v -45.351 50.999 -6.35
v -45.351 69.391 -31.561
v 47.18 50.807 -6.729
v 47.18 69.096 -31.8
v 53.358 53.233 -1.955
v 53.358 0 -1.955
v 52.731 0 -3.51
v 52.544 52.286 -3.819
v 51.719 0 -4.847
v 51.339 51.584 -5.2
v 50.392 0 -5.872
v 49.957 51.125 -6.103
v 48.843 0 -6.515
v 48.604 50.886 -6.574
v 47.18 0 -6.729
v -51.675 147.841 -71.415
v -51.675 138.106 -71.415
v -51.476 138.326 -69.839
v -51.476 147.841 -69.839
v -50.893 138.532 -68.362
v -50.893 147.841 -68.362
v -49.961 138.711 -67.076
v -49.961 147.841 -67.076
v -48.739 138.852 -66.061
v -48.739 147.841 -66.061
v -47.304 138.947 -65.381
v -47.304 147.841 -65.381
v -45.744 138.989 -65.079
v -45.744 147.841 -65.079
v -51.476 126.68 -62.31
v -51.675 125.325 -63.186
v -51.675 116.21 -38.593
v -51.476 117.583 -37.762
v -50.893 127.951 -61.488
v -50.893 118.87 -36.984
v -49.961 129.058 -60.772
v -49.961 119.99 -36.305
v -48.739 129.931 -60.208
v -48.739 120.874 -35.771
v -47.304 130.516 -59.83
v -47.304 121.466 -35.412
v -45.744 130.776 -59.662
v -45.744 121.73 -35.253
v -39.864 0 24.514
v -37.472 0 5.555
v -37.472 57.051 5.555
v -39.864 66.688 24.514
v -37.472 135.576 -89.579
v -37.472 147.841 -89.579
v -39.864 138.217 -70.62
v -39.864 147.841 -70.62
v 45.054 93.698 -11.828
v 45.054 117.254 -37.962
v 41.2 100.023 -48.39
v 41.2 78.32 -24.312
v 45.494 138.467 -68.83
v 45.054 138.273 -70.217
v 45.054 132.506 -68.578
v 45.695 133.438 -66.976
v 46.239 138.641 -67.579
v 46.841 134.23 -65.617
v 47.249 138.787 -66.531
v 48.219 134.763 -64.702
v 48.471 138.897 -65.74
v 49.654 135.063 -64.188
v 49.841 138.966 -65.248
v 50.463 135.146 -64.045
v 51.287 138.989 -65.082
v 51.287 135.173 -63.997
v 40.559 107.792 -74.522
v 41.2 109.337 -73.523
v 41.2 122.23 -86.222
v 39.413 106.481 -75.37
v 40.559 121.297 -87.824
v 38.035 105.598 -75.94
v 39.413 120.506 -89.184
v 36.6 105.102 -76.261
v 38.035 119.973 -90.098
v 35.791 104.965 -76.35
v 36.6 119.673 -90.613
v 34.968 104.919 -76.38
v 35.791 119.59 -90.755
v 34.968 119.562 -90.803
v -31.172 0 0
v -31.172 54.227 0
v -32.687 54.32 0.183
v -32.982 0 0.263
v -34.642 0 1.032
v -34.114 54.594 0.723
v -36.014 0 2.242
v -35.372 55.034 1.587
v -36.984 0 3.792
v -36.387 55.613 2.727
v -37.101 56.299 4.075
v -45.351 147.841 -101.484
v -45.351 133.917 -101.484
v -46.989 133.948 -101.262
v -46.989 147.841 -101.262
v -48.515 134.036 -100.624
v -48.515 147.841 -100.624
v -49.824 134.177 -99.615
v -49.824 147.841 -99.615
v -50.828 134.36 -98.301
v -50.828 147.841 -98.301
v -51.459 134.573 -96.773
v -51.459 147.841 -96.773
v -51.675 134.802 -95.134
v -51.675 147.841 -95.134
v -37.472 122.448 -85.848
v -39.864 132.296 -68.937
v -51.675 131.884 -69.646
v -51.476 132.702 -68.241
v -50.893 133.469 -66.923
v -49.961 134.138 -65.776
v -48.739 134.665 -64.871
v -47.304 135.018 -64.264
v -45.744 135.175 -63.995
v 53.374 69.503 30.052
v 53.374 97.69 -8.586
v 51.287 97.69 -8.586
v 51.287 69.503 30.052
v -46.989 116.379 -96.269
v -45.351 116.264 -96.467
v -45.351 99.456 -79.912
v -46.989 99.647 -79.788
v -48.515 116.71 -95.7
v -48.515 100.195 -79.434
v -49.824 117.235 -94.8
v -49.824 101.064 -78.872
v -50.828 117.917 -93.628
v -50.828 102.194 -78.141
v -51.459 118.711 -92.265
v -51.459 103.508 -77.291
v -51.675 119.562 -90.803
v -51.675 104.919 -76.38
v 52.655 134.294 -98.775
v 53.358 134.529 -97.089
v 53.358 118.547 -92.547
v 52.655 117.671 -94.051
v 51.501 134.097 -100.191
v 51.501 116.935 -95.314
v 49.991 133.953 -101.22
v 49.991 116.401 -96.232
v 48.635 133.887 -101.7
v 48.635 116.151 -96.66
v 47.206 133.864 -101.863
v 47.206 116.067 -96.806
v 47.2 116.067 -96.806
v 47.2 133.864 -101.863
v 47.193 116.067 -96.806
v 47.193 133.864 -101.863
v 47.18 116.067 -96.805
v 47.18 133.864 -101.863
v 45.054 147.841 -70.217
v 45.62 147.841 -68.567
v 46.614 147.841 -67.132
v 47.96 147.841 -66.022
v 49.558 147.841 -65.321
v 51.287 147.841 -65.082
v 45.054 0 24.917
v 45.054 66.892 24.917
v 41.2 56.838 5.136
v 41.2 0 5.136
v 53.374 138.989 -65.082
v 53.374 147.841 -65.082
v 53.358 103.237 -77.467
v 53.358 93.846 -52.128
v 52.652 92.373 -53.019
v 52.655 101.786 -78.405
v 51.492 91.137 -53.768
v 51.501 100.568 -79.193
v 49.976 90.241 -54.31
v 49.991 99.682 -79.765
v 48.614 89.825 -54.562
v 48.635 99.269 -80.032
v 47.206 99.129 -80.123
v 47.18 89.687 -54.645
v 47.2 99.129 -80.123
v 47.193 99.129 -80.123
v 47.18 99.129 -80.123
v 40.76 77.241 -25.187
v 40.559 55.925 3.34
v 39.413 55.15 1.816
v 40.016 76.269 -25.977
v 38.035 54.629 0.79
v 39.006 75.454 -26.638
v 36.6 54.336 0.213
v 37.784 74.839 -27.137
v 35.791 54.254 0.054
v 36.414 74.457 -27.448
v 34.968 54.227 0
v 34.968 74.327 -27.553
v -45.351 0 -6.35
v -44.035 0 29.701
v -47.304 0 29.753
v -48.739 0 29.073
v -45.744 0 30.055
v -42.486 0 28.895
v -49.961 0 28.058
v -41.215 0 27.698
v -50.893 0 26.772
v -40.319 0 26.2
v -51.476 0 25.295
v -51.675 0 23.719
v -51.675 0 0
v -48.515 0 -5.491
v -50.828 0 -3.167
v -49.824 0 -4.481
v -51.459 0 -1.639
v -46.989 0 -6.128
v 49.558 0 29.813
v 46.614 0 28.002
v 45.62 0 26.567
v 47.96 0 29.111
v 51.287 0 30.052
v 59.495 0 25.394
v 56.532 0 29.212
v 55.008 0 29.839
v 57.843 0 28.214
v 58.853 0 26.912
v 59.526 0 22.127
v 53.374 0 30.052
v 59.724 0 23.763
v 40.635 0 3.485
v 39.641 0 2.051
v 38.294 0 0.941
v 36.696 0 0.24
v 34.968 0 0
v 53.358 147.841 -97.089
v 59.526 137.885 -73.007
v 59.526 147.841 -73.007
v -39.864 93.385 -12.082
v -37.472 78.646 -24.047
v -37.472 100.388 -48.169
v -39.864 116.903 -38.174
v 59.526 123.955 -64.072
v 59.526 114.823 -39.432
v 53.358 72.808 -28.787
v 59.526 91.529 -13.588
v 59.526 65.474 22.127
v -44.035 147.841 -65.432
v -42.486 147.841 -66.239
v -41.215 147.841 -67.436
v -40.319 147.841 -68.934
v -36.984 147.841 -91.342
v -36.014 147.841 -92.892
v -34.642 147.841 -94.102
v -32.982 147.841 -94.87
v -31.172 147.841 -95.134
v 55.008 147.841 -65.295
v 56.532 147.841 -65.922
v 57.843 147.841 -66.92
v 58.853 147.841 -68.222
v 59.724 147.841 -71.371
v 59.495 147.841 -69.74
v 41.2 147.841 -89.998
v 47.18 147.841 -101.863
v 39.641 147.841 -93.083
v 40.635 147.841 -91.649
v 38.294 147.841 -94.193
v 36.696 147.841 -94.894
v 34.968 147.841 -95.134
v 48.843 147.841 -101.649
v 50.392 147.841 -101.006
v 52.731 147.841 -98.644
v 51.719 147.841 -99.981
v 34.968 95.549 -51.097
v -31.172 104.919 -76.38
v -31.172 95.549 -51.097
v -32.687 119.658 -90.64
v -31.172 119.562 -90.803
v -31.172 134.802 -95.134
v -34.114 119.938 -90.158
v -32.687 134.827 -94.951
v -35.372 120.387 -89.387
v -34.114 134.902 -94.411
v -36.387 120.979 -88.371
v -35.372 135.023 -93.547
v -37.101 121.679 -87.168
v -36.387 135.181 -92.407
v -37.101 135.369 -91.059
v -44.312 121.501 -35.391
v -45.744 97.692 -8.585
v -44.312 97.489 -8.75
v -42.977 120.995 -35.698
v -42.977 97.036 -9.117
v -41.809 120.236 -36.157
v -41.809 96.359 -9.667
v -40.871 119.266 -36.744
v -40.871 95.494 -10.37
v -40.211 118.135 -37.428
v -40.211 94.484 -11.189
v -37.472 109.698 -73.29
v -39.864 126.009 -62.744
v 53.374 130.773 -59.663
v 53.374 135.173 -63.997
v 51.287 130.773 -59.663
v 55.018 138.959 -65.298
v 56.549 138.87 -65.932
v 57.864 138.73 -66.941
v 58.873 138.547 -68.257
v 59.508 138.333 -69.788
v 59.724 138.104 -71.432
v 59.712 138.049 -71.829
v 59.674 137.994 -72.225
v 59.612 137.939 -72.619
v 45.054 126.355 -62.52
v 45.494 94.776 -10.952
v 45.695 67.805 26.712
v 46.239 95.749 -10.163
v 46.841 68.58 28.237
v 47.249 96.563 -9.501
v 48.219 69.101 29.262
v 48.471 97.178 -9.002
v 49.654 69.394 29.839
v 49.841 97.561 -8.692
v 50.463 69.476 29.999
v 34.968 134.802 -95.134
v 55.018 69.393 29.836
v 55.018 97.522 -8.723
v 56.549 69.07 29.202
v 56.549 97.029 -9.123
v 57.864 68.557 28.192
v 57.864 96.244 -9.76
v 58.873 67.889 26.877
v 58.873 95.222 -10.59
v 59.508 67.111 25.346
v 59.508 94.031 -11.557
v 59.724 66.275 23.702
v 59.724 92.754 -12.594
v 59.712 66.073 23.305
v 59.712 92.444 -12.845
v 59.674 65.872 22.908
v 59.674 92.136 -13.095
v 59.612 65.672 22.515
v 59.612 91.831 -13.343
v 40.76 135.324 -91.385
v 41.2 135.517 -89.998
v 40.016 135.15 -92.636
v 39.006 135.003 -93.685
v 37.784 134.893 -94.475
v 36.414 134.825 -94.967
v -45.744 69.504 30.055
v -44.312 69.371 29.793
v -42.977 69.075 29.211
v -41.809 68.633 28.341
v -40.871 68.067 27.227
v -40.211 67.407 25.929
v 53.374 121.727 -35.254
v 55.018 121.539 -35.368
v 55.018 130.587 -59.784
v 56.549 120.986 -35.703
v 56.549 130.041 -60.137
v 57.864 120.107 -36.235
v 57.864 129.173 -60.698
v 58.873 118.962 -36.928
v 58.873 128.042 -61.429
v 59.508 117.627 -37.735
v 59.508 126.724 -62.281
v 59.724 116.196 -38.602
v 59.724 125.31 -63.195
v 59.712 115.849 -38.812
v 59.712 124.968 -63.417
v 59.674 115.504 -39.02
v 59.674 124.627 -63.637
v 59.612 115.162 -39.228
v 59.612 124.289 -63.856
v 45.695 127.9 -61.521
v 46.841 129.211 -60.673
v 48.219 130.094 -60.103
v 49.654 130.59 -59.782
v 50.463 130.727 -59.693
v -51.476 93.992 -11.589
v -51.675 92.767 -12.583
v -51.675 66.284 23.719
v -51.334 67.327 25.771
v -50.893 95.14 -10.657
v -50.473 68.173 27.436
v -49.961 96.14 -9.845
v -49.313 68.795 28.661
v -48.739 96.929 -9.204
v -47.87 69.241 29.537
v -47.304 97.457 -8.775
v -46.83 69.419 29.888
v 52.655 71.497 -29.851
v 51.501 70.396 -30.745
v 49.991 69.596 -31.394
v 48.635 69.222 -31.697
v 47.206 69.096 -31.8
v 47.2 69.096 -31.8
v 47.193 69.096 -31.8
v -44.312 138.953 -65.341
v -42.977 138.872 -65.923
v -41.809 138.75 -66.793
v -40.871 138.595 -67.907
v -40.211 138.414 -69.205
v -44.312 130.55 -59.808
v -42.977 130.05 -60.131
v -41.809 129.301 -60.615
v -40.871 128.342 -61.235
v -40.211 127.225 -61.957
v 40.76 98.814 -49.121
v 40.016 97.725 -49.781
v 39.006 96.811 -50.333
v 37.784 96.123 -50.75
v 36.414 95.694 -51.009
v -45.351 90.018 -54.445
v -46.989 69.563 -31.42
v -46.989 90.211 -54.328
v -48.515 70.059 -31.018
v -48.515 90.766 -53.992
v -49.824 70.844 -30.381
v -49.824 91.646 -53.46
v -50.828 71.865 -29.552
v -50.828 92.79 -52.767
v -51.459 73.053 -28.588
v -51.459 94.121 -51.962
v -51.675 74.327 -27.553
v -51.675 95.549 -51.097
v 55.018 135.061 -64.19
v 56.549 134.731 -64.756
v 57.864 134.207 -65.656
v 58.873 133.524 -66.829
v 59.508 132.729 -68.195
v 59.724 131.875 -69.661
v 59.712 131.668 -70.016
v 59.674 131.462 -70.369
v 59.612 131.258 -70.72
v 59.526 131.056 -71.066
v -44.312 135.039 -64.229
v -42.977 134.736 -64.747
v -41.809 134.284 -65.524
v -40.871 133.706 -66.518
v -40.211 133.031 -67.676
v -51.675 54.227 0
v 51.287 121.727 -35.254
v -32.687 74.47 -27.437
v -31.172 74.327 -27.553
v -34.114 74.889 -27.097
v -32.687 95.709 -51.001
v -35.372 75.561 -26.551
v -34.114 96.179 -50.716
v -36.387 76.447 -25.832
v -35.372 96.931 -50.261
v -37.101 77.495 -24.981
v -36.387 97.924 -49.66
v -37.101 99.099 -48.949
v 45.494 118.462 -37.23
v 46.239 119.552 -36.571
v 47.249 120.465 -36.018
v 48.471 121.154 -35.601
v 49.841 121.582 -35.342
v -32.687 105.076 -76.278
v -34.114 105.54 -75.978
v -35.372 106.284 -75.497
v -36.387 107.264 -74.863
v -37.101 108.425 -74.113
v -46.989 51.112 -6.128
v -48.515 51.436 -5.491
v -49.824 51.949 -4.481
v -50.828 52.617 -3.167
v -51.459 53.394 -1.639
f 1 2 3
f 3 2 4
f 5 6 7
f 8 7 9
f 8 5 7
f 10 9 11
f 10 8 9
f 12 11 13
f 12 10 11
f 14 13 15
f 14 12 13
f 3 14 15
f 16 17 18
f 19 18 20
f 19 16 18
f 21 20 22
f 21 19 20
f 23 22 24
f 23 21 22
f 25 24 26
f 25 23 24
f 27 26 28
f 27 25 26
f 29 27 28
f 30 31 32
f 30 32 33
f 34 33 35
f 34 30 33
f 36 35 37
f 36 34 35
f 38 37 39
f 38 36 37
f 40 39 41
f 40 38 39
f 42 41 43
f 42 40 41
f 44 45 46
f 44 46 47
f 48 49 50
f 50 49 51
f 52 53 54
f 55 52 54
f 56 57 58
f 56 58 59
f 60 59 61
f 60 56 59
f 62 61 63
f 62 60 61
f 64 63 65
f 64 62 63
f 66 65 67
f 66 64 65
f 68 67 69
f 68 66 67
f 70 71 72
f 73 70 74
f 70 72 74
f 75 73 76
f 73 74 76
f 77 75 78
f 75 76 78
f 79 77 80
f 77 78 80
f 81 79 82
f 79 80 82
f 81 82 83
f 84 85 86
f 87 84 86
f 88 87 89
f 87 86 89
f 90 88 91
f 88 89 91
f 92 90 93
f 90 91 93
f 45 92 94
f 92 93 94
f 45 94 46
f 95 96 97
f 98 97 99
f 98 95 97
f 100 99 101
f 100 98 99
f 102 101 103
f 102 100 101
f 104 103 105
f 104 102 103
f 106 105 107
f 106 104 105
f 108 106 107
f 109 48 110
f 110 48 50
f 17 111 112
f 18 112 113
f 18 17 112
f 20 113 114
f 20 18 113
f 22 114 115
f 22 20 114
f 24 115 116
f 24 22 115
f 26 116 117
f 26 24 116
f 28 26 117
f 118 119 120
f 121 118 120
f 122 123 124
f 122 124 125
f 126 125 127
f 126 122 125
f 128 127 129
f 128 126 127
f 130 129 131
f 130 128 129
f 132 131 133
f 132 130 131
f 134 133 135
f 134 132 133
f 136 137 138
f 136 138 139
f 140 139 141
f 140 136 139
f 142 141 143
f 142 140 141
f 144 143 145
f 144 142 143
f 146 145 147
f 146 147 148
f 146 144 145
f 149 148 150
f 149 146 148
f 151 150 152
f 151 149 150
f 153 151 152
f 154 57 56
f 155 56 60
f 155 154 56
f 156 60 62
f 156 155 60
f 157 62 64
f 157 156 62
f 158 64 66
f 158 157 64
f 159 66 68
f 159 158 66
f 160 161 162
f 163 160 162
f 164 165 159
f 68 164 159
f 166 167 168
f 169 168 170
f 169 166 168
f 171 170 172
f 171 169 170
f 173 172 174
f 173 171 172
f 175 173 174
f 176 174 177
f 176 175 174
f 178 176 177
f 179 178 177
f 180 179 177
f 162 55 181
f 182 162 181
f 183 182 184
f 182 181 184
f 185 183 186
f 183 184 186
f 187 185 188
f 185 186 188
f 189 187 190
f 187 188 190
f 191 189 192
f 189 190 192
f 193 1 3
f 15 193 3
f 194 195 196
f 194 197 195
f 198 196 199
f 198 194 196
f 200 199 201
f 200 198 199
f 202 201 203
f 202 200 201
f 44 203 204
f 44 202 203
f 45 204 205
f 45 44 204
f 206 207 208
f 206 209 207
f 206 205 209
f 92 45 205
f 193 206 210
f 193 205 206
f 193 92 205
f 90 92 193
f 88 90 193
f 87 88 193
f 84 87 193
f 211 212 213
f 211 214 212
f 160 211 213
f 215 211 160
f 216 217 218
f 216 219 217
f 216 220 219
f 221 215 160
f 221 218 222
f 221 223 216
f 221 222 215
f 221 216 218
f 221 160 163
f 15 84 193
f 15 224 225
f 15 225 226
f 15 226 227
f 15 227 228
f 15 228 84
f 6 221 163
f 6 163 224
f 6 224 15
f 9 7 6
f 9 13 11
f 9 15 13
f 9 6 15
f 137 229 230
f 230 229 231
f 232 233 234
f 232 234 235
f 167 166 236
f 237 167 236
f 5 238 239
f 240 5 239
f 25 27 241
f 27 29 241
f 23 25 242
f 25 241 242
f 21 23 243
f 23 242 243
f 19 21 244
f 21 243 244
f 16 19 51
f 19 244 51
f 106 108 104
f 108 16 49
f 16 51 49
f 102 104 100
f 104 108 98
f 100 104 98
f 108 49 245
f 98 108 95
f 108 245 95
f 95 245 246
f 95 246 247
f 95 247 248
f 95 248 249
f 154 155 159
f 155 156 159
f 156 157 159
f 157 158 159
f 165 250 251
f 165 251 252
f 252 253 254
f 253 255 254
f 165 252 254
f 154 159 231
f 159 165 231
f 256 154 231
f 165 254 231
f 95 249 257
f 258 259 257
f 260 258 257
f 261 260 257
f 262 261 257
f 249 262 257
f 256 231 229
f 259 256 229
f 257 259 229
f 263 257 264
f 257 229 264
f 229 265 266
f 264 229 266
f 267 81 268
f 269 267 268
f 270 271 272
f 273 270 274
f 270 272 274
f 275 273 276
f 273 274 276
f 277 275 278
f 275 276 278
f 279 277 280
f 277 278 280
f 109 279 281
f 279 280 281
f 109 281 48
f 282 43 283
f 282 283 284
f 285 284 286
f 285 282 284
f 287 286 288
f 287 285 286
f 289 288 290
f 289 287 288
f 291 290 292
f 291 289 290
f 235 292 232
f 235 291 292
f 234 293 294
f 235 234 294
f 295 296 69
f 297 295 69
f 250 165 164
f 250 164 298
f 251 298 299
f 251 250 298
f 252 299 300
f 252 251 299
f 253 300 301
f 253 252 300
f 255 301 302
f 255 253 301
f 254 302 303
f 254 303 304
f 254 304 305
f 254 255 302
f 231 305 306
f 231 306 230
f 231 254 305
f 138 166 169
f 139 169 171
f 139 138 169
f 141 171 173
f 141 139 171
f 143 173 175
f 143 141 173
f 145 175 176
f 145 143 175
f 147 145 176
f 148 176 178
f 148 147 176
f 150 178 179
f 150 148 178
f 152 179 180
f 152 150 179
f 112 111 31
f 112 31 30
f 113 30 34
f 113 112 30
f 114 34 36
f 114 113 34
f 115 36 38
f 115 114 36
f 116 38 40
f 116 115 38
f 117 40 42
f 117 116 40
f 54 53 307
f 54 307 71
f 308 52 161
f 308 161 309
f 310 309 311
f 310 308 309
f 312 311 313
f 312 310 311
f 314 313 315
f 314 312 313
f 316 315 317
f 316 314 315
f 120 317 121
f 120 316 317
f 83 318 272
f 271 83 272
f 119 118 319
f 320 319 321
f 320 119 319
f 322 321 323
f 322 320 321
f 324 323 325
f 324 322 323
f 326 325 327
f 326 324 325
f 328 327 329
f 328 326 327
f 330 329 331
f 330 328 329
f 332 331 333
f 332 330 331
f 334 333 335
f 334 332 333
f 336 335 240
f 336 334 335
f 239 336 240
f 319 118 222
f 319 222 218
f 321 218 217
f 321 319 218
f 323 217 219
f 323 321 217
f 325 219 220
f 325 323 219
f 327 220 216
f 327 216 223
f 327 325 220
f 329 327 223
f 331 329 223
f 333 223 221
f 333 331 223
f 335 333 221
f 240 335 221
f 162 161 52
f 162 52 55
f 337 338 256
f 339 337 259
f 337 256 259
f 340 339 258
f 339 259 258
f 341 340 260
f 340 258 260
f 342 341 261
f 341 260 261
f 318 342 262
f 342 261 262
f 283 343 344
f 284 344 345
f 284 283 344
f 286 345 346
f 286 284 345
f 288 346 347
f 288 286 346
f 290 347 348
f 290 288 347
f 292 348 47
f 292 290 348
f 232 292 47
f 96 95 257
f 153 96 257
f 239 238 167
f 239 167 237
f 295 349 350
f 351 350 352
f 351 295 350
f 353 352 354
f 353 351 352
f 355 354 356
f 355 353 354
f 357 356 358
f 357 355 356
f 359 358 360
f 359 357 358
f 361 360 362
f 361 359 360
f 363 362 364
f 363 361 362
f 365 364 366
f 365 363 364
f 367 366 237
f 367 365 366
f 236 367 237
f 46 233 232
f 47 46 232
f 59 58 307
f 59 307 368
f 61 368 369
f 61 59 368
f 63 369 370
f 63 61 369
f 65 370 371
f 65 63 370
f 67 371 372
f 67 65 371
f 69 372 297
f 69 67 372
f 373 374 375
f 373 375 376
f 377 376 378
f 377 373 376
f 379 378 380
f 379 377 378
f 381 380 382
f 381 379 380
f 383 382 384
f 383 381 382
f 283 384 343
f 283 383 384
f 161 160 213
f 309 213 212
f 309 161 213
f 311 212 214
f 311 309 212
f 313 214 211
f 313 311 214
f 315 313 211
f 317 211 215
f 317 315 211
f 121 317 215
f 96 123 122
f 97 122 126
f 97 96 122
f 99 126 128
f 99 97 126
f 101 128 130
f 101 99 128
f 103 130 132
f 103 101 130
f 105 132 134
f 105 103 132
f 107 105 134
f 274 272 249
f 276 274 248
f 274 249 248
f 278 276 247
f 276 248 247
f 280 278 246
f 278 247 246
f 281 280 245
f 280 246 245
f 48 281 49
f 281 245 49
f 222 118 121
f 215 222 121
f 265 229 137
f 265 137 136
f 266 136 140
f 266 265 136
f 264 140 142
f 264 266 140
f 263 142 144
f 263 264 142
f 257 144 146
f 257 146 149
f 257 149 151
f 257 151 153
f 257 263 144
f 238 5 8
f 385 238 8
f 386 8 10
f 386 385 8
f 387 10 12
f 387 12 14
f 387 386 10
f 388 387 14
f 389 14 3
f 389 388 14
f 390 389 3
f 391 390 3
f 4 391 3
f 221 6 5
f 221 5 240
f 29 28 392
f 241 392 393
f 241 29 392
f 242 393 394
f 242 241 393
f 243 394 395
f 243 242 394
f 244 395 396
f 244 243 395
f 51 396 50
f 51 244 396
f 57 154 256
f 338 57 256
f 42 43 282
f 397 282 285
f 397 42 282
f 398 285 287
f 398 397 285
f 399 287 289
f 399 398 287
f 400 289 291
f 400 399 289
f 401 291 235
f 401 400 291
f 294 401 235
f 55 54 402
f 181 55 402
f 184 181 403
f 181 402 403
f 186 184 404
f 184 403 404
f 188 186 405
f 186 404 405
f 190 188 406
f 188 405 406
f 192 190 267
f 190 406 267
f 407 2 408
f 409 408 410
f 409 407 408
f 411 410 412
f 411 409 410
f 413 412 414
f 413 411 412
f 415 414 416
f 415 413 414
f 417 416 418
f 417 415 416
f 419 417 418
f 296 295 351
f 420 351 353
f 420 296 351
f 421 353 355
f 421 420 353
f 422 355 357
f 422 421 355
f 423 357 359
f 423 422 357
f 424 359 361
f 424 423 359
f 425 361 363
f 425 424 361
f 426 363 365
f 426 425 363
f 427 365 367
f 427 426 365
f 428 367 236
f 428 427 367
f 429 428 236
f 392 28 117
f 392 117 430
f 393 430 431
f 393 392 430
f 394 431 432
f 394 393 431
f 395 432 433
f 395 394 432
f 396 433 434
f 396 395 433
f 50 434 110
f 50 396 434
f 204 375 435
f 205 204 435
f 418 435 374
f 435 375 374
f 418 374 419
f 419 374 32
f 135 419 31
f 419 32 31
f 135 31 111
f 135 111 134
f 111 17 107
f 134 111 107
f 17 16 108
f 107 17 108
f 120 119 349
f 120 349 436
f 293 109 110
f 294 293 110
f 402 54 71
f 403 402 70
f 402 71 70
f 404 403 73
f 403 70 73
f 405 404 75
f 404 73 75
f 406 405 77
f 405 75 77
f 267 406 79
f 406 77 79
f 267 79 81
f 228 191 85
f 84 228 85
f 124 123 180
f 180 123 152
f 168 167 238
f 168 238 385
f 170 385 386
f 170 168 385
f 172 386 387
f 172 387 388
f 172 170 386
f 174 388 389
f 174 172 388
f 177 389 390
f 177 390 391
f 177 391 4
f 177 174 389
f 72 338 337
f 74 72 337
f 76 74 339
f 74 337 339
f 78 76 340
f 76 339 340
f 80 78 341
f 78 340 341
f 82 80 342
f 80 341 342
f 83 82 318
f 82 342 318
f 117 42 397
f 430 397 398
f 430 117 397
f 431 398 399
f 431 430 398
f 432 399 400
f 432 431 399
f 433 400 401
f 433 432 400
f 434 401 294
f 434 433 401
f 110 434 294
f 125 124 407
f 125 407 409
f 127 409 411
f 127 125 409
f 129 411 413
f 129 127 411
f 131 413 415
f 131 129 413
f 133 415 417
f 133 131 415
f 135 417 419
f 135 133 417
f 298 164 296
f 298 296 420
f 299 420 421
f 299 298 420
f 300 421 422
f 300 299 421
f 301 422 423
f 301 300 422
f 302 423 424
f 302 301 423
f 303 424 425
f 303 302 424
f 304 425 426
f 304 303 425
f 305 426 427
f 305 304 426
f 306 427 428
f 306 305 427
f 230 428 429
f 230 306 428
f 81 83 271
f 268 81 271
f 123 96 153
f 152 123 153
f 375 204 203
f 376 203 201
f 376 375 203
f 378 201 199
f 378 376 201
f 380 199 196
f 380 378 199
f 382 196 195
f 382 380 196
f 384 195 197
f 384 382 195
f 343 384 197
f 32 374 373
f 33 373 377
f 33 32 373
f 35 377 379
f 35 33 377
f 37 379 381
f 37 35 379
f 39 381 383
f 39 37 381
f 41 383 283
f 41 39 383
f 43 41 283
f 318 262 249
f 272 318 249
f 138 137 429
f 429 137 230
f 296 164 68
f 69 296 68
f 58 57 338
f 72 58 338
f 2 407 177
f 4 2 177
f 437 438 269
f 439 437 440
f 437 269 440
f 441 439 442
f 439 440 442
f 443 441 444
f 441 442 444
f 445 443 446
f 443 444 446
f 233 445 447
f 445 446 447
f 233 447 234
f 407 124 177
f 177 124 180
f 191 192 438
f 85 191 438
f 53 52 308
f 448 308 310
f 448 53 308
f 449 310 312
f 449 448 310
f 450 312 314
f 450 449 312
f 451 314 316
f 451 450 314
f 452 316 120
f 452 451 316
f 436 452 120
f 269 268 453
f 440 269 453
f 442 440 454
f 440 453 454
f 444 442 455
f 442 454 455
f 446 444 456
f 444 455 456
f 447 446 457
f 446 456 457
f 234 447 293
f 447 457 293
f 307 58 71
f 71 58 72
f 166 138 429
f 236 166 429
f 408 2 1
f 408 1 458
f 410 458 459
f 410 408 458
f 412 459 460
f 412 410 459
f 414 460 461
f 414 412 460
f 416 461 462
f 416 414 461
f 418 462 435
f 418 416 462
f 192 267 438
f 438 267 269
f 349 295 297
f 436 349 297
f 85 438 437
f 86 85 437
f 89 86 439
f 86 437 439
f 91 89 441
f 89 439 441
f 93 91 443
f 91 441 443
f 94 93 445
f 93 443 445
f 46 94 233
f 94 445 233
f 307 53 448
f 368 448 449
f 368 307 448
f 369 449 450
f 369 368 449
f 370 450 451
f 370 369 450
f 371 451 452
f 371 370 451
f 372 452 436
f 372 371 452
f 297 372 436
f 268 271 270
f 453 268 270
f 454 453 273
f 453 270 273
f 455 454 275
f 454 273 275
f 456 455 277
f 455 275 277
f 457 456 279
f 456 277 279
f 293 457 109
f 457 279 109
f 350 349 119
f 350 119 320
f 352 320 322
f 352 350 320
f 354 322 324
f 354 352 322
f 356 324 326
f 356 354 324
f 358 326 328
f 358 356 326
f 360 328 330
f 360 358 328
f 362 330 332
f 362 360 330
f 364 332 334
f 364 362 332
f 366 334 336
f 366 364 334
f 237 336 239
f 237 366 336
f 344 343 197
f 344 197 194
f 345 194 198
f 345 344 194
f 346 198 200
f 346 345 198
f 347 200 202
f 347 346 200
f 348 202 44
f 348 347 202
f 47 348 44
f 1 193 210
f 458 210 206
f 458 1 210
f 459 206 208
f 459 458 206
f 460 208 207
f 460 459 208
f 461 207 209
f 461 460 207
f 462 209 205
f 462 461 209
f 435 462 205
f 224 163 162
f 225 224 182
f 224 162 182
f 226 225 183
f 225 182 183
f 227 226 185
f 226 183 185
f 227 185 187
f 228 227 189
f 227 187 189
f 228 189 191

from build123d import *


with BuildPart() as f2:
    # F2: sweep along a path in F1
    with BuildLine(Plane.YZ) as f2_path:
        Line((0, 0), (54.2271062732, 0))
        Line((54.2271062732, 0), (74.3272826076, -27.5529418141))
        Line((74.3272826076, -27.5529418141), (95.5489575863, -51.0973446071))
        Line((95.5489575863, -51.0973446071), (104.9186140299, -76.3795748353))
        Line((104.9186140299, -76.3795748353), (119.5624619722, -90.8030569553))
        Line((119.5624619722, -90.8030569553), (134.8015367985, -95.1338708401))
        Line((134.8015367985, -95.1338708401), (147.8405743837, -95.1338708401))
    # F0 (on Front) → F2 (sweep)
    with BuildSketch(Plane.XZ):
        with BuildLine():
            Line((-51.6746714711, 23.7191500306), (-51.6746714711, 0))
            ThreePointArc((-51.6746714711, 0), (-49.8239963657, -4.4809123505), (-45.350710686, -6.3499466107))
            Line((-45.350710686, -6.3499466107), (47.1804031889, -6.7293887862))
            ThreePointArc((47.1804031889, -6.7293887862), (51.089613293, -5.4037315626), (53.357891469, -1.9549339708))
            Line((53.357891469, -1.9549339708), (59.5256559013, 22.1268726525))
            ThreePointArc((59.5256559013, 22.1268726525), (58.3905238566, 27.5958286572), (53.374206836, 30.0523644478))
            Line((53.374206836, 30.0523644478), (51.2866688171, 30.0523644478))
            ThreePointArc((51.2866688171, 30.0523644478), (47.2485796403, 28.6030109154), (45.0538349714, 24.9165646999))
            Line((45.0538349714, 24.9165646999), (41.2004016239, 5.1357997479))
            ThreePointArc((41.2004016239, 5.1357997479), (39.005656955, 1.4493535324), (34.9675677782, 0))
            Line((34.9675677782, 0), (-31.172045563, 0))
            ThreePointArc((-31.172045563, 0), (-35.3717492022, 1.587123837), (-37.472098588, 5.5551214666))
            Line((-37.472098588, 5.5551214666), (-39.8641464341, 24.514028564))
            ThreePointArc((-39.8641464341, 24.514028564), (-41.8092828653, 28.3405352625), (-45.7444354651, 30.0552606822))
            ThreePointArc((-45.7444354651, 30.0552606822), (-49.9608337505, 28.0583319027), (-51.6746714711, 23.7191500306))
        make_face()
    sweep(path=f2_path.line, transition=Transition.RIGHT)


solid = f2.part
